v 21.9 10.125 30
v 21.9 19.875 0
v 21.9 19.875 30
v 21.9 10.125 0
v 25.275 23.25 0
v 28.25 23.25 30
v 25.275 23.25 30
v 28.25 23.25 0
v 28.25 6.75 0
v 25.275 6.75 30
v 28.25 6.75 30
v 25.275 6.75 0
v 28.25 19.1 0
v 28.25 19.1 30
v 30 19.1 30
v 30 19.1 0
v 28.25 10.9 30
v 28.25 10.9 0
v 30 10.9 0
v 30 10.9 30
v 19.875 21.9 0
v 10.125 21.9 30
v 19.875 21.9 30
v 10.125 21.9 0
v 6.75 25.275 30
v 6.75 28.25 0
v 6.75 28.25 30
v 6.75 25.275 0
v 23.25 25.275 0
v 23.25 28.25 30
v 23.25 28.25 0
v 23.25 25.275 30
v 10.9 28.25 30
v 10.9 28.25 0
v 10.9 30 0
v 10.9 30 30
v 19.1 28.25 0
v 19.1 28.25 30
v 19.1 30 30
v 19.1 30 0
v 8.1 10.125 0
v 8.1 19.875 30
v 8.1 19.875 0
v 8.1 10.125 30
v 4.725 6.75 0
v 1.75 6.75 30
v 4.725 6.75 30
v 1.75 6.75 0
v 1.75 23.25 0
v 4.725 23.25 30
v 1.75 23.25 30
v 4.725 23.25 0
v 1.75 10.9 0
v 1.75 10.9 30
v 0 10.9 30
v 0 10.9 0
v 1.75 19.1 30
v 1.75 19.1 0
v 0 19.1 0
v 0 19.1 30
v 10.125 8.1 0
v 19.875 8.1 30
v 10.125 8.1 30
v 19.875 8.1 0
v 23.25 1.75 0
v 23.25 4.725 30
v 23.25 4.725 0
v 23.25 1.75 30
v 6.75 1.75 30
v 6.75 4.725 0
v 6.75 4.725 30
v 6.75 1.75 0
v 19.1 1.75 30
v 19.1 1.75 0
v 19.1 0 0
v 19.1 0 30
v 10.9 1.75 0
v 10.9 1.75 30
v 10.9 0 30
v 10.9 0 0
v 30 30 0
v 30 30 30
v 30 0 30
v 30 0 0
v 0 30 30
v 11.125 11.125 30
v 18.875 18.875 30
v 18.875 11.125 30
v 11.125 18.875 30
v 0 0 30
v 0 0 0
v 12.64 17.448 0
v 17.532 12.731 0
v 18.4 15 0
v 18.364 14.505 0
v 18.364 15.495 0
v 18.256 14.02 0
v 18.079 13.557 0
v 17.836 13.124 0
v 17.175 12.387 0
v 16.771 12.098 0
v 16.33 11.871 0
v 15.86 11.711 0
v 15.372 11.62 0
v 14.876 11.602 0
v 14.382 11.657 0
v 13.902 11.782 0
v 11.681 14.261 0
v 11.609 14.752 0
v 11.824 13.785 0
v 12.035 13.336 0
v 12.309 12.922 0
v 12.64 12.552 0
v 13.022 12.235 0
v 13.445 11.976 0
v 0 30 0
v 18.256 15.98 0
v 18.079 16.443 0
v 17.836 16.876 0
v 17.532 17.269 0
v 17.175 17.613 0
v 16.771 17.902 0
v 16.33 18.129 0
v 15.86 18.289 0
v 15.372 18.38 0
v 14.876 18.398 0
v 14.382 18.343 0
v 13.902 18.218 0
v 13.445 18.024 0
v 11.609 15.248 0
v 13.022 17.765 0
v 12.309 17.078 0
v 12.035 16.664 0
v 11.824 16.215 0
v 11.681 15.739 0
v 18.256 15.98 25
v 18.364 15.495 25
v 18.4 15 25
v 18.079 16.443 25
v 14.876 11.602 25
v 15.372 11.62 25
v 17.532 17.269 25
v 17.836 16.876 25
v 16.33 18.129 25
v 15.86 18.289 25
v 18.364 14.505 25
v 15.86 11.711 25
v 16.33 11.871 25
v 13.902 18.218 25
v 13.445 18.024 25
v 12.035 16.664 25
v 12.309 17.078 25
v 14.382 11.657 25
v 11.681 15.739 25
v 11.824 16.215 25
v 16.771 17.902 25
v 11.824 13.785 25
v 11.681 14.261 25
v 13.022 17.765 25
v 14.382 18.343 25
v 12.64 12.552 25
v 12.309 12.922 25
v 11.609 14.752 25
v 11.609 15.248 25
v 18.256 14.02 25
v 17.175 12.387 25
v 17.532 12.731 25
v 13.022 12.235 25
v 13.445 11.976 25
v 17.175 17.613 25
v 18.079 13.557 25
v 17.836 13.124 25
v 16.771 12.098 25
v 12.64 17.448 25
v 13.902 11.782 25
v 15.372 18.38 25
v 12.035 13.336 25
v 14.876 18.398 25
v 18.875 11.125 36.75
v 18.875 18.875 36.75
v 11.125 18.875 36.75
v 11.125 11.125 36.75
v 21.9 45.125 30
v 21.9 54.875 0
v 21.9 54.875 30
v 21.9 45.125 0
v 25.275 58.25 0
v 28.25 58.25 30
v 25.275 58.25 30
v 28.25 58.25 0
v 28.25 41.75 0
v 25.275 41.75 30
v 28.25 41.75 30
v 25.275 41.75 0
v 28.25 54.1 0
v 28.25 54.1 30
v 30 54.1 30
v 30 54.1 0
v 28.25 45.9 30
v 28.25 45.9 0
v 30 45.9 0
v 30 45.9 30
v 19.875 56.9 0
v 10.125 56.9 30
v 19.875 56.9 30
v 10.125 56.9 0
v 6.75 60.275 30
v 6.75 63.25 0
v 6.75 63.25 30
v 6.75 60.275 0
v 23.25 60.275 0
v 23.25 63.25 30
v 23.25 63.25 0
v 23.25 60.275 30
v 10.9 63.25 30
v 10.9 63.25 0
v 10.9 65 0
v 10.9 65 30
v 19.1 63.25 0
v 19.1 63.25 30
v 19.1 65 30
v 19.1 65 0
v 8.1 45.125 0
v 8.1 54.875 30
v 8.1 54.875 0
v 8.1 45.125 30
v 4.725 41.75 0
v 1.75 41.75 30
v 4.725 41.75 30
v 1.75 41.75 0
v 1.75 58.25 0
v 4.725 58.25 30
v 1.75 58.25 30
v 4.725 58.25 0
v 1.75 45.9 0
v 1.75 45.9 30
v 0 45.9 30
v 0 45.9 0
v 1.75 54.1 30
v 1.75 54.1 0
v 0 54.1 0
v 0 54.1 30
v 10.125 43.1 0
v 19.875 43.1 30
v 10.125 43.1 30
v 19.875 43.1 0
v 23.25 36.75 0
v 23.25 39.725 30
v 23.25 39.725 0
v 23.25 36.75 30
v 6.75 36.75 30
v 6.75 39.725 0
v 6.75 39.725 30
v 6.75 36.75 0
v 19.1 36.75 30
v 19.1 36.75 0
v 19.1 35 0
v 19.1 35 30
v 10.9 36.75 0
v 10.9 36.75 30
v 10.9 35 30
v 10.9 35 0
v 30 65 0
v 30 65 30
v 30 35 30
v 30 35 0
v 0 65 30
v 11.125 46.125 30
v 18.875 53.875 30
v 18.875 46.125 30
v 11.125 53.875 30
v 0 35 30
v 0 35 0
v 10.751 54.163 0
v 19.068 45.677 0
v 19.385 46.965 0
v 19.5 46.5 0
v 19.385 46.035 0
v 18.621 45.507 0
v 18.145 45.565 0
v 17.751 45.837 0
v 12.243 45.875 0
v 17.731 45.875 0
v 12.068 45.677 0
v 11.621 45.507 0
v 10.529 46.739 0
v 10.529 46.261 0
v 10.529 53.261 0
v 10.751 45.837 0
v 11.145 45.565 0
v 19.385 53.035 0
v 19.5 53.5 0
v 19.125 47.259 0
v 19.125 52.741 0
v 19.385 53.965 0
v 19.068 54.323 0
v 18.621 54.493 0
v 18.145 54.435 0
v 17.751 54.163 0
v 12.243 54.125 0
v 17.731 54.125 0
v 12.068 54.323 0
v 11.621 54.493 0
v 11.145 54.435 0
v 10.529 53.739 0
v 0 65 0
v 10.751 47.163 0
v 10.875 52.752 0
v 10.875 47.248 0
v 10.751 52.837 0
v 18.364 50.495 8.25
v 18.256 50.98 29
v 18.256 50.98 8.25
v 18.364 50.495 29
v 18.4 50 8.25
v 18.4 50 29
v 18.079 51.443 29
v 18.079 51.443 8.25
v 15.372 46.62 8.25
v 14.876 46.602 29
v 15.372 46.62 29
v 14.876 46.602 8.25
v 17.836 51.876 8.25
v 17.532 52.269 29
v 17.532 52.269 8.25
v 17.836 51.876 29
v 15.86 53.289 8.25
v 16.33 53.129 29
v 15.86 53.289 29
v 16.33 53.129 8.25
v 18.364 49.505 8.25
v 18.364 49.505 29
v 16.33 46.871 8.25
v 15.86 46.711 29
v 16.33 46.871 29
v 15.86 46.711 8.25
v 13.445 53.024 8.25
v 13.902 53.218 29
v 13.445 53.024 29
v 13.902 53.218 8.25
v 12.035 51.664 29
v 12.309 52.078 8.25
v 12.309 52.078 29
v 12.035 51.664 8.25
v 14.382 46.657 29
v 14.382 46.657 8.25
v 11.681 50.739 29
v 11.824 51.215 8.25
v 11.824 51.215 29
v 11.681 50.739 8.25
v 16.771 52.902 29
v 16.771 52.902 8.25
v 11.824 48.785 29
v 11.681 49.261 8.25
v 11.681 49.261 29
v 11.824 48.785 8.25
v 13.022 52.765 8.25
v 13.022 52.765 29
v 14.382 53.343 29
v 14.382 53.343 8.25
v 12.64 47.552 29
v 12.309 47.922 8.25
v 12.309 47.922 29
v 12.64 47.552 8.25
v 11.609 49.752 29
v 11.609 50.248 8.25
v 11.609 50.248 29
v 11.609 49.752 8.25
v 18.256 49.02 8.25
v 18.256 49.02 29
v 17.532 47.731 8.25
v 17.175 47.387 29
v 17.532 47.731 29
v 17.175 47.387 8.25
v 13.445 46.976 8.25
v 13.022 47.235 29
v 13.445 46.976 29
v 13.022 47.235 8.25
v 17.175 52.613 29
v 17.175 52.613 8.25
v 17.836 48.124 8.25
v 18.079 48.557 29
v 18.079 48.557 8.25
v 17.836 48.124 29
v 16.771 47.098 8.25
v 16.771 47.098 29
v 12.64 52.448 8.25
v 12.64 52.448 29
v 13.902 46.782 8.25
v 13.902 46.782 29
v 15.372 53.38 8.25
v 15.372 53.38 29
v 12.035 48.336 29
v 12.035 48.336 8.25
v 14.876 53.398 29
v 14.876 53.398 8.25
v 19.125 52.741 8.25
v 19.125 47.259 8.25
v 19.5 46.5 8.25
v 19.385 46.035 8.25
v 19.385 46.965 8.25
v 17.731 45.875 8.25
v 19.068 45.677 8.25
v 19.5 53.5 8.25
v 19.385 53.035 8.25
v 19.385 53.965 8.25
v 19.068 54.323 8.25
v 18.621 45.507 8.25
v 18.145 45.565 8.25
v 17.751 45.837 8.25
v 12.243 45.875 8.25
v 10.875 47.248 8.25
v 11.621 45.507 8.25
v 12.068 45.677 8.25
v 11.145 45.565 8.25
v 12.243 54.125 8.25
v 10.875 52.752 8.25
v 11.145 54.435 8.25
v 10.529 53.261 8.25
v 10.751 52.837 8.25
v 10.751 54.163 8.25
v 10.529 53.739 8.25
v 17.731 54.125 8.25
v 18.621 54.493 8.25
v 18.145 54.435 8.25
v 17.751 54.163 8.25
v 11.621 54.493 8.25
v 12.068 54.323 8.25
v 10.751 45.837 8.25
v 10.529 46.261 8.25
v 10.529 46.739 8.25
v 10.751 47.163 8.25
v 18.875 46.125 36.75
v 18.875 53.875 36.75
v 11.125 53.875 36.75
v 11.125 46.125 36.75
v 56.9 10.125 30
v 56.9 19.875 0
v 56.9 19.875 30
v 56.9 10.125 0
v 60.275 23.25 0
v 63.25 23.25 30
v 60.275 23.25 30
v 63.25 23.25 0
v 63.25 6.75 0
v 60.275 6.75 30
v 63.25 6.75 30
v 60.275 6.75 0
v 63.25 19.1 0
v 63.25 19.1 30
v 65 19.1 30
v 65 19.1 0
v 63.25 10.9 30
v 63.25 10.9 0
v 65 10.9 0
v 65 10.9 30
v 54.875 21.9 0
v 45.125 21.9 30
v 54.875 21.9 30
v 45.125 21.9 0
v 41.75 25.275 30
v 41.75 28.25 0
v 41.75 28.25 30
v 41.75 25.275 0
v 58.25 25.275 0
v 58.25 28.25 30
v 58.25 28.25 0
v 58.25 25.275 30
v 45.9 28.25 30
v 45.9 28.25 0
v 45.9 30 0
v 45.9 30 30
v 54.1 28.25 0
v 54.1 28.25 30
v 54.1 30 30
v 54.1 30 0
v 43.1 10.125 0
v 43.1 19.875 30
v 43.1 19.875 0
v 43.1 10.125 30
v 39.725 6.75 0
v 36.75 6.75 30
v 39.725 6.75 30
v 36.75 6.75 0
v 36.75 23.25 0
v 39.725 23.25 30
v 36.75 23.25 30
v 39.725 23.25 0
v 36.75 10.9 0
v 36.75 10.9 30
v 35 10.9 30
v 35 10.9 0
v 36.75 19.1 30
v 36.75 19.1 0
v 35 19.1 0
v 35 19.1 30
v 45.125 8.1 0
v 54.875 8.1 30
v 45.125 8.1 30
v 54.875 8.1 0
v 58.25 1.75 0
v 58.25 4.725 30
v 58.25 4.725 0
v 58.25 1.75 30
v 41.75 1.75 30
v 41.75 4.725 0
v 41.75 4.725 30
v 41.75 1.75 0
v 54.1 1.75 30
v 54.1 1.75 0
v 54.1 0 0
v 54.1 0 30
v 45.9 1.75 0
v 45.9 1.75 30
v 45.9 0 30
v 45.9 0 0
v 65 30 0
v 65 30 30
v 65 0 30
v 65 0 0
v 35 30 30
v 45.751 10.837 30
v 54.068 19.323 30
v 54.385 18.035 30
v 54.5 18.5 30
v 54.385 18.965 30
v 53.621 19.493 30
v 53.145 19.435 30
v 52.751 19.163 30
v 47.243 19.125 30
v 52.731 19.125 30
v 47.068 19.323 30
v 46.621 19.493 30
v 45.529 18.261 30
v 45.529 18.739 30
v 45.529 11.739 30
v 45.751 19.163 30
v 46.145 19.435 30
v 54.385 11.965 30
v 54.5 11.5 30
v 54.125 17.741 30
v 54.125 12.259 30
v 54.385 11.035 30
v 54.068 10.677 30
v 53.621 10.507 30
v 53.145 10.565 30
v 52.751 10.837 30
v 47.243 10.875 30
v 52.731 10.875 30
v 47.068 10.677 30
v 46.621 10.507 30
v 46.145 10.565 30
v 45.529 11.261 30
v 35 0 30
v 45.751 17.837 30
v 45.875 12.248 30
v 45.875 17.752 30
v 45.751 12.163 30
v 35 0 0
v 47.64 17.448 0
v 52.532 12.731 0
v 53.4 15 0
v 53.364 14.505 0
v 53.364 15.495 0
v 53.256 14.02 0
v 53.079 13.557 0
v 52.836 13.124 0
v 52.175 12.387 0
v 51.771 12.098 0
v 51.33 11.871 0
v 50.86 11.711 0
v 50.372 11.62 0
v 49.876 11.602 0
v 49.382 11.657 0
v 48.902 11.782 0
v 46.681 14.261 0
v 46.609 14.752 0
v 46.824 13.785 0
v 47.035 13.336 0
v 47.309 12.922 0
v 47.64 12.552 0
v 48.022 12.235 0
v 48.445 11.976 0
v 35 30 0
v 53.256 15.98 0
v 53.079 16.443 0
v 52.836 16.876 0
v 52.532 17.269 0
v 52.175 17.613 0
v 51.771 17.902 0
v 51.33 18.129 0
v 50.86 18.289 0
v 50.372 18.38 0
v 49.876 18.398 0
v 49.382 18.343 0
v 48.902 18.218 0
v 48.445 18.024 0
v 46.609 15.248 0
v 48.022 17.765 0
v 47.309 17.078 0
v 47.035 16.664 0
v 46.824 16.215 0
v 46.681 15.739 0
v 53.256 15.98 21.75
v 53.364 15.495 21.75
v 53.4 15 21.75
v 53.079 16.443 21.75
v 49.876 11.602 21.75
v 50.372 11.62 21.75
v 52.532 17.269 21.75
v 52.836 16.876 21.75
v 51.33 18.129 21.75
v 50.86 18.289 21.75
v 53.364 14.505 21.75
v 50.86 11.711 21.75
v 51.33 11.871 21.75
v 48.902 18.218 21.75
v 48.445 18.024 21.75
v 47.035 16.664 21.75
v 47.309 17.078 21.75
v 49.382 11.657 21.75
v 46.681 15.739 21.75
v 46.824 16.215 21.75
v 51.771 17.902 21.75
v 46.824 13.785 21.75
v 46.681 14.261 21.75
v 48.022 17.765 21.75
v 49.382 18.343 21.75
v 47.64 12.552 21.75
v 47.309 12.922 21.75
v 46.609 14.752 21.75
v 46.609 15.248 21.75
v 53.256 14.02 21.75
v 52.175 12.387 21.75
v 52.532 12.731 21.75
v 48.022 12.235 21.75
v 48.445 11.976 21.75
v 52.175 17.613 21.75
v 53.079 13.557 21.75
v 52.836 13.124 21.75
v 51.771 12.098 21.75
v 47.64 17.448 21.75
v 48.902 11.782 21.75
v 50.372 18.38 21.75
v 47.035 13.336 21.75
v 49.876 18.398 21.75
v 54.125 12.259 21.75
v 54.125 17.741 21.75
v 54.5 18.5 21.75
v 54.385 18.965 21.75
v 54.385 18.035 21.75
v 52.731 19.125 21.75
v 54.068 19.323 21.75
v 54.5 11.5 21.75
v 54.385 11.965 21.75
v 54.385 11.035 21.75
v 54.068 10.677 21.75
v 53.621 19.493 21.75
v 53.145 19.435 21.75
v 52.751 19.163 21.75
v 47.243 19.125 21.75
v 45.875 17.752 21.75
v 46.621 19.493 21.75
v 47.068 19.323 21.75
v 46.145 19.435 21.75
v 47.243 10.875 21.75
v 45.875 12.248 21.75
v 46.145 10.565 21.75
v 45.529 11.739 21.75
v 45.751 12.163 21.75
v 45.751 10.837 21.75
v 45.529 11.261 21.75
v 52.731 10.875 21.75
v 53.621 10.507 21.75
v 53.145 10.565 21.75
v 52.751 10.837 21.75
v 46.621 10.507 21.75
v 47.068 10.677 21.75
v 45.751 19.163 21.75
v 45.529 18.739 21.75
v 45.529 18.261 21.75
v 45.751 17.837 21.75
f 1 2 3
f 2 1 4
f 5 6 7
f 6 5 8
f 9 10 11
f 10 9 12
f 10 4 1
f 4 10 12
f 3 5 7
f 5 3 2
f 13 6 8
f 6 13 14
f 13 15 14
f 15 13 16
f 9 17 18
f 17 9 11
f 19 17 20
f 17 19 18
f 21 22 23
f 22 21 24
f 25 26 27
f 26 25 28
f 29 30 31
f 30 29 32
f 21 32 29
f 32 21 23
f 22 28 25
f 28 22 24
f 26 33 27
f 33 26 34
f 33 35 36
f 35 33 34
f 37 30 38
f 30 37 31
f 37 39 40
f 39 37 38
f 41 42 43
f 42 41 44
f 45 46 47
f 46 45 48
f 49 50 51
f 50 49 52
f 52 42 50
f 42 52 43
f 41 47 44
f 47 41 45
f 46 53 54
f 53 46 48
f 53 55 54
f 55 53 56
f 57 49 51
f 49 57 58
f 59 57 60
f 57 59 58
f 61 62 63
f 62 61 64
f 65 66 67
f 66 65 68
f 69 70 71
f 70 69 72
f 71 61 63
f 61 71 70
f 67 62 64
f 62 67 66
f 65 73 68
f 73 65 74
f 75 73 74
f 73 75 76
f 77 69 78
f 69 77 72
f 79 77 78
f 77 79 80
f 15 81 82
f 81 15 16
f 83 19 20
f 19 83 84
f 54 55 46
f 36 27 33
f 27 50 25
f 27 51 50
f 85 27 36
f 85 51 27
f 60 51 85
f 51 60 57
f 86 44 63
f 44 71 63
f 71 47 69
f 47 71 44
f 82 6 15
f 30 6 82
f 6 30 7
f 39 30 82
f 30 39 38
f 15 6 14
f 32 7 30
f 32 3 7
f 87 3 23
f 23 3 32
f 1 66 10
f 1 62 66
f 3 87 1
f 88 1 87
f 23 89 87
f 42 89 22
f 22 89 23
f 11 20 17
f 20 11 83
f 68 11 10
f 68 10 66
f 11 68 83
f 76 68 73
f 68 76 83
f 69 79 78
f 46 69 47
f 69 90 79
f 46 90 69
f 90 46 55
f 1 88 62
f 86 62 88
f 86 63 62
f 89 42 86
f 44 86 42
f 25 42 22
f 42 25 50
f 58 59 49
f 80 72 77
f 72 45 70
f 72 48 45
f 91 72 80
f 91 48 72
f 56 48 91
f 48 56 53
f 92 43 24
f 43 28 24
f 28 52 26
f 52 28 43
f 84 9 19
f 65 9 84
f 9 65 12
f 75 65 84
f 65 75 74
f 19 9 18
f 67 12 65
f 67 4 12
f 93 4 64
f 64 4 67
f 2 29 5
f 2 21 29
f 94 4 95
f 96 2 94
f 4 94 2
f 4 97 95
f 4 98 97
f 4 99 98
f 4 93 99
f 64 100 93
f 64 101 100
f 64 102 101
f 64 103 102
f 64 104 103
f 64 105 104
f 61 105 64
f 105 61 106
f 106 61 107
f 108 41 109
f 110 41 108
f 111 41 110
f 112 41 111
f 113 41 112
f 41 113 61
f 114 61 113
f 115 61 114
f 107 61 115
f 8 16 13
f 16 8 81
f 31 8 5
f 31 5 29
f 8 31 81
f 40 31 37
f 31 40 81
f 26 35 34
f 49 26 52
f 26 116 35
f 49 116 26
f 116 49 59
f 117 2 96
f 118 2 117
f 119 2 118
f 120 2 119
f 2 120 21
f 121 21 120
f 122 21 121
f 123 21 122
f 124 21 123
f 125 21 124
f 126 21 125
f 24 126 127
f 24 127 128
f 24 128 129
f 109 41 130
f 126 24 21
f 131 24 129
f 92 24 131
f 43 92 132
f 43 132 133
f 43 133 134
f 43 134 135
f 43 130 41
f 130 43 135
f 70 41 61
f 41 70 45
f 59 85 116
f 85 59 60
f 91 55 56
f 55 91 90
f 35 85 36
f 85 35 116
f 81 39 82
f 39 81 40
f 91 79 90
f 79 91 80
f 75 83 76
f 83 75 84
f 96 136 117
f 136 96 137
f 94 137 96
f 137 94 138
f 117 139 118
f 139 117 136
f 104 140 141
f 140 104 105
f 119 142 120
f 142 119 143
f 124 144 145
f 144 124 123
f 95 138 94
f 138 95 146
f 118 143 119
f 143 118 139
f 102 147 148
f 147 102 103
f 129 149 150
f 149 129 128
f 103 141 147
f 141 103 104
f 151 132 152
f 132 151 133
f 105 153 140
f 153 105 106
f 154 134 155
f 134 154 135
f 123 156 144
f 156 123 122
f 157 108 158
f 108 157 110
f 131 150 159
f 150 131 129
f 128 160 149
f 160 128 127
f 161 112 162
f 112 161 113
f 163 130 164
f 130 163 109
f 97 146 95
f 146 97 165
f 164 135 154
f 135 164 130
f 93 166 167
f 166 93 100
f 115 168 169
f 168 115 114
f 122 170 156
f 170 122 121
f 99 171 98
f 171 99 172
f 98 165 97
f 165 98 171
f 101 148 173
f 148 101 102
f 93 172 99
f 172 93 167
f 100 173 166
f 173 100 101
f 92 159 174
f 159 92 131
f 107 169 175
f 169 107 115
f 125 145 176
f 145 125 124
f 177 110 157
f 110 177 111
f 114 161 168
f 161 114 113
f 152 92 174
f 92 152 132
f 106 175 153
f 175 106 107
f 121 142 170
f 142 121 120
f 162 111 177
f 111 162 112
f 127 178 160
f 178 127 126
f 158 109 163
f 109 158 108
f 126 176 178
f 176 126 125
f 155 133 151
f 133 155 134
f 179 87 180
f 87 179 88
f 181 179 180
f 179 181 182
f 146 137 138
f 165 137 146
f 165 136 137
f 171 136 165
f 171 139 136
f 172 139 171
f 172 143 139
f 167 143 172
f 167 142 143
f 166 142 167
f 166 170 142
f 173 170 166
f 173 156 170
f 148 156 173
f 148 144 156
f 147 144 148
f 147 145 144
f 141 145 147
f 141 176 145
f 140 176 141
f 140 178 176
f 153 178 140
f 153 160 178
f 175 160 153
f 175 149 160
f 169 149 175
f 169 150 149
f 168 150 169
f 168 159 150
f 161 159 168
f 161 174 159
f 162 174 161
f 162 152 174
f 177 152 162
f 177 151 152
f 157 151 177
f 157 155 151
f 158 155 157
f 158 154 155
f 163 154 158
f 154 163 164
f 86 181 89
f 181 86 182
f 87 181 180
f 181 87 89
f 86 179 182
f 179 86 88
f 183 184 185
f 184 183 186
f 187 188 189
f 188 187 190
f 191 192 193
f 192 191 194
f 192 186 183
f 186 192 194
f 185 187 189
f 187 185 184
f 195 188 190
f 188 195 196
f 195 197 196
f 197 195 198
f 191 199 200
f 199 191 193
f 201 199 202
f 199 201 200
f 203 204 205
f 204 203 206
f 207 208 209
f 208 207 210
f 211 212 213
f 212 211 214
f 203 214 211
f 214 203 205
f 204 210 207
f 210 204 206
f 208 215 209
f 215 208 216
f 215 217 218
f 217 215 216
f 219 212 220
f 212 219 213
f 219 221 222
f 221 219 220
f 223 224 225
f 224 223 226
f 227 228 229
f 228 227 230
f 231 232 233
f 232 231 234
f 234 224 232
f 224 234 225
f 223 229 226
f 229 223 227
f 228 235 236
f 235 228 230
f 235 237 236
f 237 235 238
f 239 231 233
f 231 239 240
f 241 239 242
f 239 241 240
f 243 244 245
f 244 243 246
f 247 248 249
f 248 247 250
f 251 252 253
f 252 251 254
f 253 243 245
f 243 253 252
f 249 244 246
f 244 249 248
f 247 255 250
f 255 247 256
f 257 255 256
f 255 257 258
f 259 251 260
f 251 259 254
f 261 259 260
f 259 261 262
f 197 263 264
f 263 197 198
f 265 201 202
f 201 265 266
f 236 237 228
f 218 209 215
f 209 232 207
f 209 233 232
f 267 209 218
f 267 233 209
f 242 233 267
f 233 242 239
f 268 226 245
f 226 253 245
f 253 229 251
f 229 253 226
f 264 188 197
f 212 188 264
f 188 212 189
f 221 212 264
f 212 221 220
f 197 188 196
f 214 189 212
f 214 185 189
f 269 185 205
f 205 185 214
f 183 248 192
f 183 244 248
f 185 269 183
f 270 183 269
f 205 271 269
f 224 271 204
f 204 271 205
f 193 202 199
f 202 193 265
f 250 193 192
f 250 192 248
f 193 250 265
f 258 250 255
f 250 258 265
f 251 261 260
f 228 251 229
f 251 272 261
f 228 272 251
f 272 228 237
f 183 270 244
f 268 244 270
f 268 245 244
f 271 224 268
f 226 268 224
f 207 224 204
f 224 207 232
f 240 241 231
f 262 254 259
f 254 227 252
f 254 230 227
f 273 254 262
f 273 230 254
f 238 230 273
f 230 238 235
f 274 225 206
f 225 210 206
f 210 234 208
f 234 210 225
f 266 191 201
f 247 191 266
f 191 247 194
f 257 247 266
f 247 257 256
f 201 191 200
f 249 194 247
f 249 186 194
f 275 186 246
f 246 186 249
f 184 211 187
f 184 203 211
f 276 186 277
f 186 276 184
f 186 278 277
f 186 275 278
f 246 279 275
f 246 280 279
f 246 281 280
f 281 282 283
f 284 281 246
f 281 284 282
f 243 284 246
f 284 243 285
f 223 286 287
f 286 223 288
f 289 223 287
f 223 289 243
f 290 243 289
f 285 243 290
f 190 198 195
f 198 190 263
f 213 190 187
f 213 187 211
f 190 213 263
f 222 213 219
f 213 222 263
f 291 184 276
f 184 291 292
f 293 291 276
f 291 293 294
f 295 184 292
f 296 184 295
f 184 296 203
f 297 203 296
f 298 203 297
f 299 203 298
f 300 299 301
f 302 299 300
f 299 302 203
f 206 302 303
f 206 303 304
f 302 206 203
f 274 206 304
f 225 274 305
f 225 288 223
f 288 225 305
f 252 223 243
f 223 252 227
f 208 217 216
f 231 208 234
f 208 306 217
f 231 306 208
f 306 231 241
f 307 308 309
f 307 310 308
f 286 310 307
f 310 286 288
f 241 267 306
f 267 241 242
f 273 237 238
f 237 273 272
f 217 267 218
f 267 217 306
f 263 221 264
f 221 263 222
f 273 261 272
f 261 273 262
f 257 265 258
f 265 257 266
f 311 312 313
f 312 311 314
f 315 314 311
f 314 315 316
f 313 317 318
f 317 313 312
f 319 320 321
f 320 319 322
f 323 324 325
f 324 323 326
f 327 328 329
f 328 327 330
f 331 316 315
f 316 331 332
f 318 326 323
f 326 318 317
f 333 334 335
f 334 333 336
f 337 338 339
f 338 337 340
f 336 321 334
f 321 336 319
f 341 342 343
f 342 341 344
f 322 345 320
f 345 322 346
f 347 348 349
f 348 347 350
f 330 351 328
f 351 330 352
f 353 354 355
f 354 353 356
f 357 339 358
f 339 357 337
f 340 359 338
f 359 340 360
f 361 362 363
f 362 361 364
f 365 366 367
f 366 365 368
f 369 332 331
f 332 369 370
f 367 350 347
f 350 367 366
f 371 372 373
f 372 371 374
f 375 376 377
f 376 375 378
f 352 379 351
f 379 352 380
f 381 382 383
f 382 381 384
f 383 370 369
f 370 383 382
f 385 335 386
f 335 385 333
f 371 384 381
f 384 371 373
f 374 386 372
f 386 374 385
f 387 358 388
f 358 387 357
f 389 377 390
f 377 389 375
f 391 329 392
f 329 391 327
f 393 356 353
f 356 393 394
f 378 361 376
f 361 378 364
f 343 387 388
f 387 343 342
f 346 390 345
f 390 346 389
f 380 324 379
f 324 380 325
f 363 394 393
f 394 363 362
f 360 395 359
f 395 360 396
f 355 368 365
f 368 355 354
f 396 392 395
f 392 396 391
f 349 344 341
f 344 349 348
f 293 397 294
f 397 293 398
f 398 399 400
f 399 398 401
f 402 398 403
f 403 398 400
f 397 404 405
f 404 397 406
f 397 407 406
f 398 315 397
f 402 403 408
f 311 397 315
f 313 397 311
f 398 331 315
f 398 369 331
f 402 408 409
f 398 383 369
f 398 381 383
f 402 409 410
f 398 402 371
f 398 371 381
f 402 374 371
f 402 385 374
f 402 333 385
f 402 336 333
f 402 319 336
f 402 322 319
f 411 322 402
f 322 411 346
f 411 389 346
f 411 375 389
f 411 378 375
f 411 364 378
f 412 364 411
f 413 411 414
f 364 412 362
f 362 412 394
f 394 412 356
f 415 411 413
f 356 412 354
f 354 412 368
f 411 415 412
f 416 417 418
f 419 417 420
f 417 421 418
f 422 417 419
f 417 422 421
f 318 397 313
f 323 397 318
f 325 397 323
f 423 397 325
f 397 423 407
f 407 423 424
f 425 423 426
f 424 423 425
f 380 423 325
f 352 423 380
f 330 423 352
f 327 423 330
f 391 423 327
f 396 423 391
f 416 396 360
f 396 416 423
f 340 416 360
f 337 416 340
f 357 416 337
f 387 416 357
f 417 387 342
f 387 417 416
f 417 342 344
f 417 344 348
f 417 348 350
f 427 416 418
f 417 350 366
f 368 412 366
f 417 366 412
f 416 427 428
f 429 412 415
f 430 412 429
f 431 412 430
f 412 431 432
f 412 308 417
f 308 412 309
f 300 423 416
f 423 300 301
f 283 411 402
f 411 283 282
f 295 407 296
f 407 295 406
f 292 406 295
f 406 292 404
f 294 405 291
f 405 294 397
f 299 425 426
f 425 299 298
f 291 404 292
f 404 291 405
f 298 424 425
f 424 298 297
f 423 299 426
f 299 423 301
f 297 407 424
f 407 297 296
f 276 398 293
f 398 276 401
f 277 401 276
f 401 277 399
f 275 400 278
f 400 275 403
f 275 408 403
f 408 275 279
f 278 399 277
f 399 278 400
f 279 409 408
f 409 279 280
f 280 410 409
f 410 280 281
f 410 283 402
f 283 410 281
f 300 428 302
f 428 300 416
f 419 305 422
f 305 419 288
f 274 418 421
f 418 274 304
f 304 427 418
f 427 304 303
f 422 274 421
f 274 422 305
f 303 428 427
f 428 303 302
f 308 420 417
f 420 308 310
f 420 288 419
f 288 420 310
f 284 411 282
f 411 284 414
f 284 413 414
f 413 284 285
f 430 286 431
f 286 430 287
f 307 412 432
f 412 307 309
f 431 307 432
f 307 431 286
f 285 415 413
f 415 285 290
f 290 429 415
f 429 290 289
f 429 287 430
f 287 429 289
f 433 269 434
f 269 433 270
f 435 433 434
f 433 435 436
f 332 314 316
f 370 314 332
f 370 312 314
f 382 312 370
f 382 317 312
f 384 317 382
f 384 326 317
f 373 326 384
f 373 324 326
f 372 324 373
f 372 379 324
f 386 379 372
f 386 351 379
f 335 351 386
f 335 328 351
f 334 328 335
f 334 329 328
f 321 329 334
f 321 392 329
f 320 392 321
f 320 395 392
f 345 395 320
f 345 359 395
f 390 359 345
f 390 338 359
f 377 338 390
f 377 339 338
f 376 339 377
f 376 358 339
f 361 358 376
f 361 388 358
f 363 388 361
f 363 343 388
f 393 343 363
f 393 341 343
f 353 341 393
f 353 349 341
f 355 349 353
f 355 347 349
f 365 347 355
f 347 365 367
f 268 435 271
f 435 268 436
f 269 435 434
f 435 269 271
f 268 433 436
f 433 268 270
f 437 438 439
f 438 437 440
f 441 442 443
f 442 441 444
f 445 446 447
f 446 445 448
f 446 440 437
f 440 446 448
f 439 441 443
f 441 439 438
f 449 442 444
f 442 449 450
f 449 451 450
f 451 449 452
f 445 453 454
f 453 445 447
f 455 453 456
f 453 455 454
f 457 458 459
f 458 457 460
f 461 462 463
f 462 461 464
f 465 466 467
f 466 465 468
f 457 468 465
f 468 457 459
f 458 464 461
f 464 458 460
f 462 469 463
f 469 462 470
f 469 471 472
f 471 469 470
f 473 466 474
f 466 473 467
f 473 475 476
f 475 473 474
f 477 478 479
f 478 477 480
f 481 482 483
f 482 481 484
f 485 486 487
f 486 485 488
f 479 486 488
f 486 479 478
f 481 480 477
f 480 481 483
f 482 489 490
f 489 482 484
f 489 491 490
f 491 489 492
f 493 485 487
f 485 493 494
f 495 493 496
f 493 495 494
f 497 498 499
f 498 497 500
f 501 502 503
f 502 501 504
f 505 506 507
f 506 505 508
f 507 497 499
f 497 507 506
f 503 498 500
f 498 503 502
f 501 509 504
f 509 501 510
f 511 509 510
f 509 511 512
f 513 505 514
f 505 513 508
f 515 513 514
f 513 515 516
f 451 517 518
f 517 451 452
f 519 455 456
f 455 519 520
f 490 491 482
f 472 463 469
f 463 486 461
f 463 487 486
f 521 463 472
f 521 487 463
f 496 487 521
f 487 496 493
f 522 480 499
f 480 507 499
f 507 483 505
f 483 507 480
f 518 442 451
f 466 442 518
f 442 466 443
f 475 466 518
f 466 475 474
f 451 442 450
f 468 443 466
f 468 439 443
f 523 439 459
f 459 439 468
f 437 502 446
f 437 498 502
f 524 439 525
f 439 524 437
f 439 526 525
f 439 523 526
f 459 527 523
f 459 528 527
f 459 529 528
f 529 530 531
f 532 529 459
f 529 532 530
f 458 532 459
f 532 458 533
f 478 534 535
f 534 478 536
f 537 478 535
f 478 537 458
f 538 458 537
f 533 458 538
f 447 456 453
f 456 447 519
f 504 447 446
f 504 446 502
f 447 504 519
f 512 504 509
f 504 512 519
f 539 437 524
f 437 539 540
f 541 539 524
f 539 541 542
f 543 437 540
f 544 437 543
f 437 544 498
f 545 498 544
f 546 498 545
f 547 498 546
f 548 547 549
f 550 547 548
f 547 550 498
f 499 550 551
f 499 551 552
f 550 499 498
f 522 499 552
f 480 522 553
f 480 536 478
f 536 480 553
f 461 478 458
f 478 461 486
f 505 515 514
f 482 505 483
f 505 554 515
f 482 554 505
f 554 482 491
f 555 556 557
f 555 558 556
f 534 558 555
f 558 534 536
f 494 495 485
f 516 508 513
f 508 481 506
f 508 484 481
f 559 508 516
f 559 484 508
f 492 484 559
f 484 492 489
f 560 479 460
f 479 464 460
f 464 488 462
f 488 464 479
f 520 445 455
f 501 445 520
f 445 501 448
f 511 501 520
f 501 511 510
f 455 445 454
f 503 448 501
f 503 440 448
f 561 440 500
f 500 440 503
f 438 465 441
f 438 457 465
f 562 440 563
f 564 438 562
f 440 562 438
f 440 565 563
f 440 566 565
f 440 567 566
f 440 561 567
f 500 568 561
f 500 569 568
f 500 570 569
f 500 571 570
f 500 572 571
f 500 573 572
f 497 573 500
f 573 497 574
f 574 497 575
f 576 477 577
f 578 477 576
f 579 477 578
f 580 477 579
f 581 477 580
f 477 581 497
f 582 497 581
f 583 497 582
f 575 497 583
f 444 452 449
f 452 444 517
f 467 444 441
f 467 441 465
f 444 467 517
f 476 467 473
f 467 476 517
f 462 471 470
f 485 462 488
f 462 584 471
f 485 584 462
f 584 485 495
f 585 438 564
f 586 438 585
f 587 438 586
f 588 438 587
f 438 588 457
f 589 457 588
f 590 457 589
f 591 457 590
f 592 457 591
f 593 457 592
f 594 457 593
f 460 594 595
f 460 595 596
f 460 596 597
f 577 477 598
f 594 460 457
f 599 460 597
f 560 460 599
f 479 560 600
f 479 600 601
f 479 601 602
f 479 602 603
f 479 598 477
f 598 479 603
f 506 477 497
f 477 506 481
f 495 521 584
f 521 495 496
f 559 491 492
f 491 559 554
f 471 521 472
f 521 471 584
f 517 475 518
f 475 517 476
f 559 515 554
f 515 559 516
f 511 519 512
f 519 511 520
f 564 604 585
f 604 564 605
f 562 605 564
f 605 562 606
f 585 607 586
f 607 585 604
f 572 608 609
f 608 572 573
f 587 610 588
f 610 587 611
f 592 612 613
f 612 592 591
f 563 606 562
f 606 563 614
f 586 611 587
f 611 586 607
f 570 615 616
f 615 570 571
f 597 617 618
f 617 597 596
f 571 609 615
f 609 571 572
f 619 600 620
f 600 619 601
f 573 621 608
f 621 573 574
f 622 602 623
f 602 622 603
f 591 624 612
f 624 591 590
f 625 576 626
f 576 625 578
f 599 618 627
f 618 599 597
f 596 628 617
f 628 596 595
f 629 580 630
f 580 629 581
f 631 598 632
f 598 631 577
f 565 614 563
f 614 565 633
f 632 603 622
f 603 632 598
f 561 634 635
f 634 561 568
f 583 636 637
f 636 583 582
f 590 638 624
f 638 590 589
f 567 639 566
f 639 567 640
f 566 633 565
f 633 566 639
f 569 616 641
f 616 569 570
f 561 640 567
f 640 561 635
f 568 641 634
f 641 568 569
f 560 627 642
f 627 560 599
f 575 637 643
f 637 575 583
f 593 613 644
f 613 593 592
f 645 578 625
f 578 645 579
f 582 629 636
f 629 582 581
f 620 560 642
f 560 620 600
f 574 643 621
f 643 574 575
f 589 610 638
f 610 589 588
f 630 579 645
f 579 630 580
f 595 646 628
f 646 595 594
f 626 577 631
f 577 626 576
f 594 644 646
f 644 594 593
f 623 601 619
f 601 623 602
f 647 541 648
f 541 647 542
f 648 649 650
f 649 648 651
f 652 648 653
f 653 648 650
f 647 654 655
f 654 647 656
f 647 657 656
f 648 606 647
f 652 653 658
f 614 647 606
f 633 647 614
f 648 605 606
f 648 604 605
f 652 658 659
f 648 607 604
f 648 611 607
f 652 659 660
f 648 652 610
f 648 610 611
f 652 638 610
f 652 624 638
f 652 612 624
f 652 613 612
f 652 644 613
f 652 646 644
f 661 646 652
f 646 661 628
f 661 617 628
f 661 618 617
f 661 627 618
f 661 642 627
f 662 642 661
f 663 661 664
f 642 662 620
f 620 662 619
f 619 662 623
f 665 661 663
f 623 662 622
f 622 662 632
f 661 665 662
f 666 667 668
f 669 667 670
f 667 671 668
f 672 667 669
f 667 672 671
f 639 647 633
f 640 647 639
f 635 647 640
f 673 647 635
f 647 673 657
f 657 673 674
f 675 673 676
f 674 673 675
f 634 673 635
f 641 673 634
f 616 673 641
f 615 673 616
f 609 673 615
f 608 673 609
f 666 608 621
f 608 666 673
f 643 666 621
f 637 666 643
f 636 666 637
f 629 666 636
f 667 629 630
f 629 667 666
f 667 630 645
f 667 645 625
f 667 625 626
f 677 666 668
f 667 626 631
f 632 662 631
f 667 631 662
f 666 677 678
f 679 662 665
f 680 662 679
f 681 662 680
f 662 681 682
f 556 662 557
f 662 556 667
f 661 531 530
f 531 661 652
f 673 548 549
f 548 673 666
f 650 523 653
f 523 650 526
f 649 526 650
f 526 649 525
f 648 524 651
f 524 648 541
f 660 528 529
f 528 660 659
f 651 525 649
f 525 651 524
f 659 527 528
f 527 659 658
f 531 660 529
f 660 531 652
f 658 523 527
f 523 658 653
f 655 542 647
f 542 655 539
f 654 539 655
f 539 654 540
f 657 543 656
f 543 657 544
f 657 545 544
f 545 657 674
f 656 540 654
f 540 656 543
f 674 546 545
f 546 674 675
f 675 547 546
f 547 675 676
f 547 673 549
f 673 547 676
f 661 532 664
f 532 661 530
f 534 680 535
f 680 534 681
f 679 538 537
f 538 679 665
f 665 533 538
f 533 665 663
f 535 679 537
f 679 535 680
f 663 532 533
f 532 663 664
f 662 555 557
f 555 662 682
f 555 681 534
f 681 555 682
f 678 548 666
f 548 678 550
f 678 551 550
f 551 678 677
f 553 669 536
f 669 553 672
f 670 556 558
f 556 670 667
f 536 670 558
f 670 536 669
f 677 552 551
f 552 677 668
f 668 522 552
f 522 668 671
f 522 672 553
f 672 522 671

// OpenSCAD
profileLength = 90;
//printX = 150; Not implemented
//printY = 150; Not implemented
printZHeight = 50;
printTolerance = 0.25; //Change dimensions of pin and hole 0.25mm equals gab of 0.5 mm
spaceBetweenProfiles = 5;
$fa=0.5; // default minimum facet angle is now 0.5
$fs=0.5; // default minimum facet size is now 0.5 mm

if(profileLength <= printZHeight) {
	translate([15,15,profileLength/2]) profile(profileLength);
} else {
	numOfProfiles = ceil(profileLength/(printZHeight-8));
	numOfRow = ceil(sqrt(numOfProfiles));
	currentProfile = 2;
	start = 0;
	translate([start,start,0]) profileWithPin(profileLength/numOfProfiles, printTolerance);
	for(row=[0:numOfRow-1]) {
		for(col=[0:numOfRow-1]) {
			if(row*numOfRow+col < numOfProfiles-1 && row*numOfRow+col > 0) {
				translate([start+row*(30+spaceBetweenProfiles),start+col*(30+spaceBetweenProfiles),0]) profileWithHoleAndPin(profileLength/numOfProfiles, printTolerance);
			} else {
				if(row*numOfRow+col < numOfProfiles) {
					translate([start+row*(30+spaceBetweenProfiles),start+col*(30+spaceBetweenProfiles),0]) profileWithHole(profileLength/numOfProfiles, printTolerance);
					lastProfileDone = 1;
				}
			}
		}
	}
}

module hole(height, size) {
	radius = 1;
	divider = 1.6;
	union() {
		cube([size,size,height], center = true);
		translate([size/2-radius/divider,size/2-radius/divider,0]) cylinder(h=height, r=radius, center = true);
		translate([size/2-radius/divider,-size/2+radius/divider,0]) cylinder(h=height, r=radius, center = true);
		translate([-size/2+radius/divider,size/2-radius/divider,0]) cylinder(h=height, r=radius, center = true);
		translate([-size/2+radius/divider,-size/2+radius/divider,0]) cylinder(h=height, r=radius, center = true);
	}
}

module profileWithPin(length, tolerance) {
	height = 8 - tolerance - 1;
	size = 8 - tolerance;
	plunge = 5;
	translate([15,15,length/2]) union() {
		profile(length);
		translate([0,0,length/2+(height+plunge)/2-plunge]) cube([size,size,height+plunge], center = true);
	}
}

module profileWithHole(length, tolerance) {
	height = 8 + tolerance;
	size = 8 + tolerance;
	plunge = 1;
	translate([15,15,length/2]) difference() {
		profile(length);
		translate([0,0,length/2-(height+plunge)/2+plunge]) hole(height+plunge, size);
	}
}

module profileWithHoleAndPin(length, tolerance) {
	heightHole = 8 + tolerance;
	heightPin = 7 - tolerance;
	size = 8;
	plunge = 1;
	translate([15,15,length/2]) union() {
		difference() {
			profile(length);
			translate([0,0,-length/2+(heightHole+plunge)/2-plunge]) hole(heightHole+plunge, size+tolerance);
		}
		translate([0,0,length/2+(heightPin+plunge)/2-plunge]) cube([size-tolerance,size-tolerance,heightPin+plunge], center = true);
	}
}

module profile(length) { // generate a profile based on length
	difference() {
		// Create main body
		cube([30,30,length], center = true);
		
		// Create hole in middle
		cylinder(r=6.8/2, h=length+2, center = true);

		// Create groove
		grooveLength = length + 2;
		lengthOfCenterSide = 9.75;
		gabWidth = 8.2;
		gabDepth = 8.1;
		sizeOfCube = 16.5;
		gabFrontWallWidth = 1.75;
		sizeOfCornerCube = sqrt(pow(sizeOfCube/2, 2)*2);
		for(i = [0:90:270]) {
			rotate([0,0,i]) translate([sizeOfCube/2-gabDepth+30/2,0,0]) difference() {
				cube([sizeOfCube,sizeOfCube,grooveLength], center = true);
				translate([-sizeOfCube/2,-sizeOfCube/2-lengthOfCenterSide/2,0]) rotate([0,0,45]) cube([sizeOfCornerCube,sizeOfCornerCube,grooveLength+2], center = true);
				translate([-sizeOfCube/2,sizeOfCube/2+lengthOfCenterSide/2,0]) rotate([0,0,45]) cube([sizeOfCornerCube,sizeOfCornerCube,grooveLength+2], center = true);
				translate([gabDepth-gabFrontWallWidth,sizeOfCube/2+gabWidth/2,0]) cube([sizeOfCube,sizeOfCube,grooveLength+2], center = true);
				translate([gabDepth-gabFrontWallWidth,-sizeOfCube/2-gabWidth/2,0]) cube([sizeOfCube,sizeOfCube,grooveLength+2], center = true);
			}
		}
	}
}
//cube([30,30,length]);
